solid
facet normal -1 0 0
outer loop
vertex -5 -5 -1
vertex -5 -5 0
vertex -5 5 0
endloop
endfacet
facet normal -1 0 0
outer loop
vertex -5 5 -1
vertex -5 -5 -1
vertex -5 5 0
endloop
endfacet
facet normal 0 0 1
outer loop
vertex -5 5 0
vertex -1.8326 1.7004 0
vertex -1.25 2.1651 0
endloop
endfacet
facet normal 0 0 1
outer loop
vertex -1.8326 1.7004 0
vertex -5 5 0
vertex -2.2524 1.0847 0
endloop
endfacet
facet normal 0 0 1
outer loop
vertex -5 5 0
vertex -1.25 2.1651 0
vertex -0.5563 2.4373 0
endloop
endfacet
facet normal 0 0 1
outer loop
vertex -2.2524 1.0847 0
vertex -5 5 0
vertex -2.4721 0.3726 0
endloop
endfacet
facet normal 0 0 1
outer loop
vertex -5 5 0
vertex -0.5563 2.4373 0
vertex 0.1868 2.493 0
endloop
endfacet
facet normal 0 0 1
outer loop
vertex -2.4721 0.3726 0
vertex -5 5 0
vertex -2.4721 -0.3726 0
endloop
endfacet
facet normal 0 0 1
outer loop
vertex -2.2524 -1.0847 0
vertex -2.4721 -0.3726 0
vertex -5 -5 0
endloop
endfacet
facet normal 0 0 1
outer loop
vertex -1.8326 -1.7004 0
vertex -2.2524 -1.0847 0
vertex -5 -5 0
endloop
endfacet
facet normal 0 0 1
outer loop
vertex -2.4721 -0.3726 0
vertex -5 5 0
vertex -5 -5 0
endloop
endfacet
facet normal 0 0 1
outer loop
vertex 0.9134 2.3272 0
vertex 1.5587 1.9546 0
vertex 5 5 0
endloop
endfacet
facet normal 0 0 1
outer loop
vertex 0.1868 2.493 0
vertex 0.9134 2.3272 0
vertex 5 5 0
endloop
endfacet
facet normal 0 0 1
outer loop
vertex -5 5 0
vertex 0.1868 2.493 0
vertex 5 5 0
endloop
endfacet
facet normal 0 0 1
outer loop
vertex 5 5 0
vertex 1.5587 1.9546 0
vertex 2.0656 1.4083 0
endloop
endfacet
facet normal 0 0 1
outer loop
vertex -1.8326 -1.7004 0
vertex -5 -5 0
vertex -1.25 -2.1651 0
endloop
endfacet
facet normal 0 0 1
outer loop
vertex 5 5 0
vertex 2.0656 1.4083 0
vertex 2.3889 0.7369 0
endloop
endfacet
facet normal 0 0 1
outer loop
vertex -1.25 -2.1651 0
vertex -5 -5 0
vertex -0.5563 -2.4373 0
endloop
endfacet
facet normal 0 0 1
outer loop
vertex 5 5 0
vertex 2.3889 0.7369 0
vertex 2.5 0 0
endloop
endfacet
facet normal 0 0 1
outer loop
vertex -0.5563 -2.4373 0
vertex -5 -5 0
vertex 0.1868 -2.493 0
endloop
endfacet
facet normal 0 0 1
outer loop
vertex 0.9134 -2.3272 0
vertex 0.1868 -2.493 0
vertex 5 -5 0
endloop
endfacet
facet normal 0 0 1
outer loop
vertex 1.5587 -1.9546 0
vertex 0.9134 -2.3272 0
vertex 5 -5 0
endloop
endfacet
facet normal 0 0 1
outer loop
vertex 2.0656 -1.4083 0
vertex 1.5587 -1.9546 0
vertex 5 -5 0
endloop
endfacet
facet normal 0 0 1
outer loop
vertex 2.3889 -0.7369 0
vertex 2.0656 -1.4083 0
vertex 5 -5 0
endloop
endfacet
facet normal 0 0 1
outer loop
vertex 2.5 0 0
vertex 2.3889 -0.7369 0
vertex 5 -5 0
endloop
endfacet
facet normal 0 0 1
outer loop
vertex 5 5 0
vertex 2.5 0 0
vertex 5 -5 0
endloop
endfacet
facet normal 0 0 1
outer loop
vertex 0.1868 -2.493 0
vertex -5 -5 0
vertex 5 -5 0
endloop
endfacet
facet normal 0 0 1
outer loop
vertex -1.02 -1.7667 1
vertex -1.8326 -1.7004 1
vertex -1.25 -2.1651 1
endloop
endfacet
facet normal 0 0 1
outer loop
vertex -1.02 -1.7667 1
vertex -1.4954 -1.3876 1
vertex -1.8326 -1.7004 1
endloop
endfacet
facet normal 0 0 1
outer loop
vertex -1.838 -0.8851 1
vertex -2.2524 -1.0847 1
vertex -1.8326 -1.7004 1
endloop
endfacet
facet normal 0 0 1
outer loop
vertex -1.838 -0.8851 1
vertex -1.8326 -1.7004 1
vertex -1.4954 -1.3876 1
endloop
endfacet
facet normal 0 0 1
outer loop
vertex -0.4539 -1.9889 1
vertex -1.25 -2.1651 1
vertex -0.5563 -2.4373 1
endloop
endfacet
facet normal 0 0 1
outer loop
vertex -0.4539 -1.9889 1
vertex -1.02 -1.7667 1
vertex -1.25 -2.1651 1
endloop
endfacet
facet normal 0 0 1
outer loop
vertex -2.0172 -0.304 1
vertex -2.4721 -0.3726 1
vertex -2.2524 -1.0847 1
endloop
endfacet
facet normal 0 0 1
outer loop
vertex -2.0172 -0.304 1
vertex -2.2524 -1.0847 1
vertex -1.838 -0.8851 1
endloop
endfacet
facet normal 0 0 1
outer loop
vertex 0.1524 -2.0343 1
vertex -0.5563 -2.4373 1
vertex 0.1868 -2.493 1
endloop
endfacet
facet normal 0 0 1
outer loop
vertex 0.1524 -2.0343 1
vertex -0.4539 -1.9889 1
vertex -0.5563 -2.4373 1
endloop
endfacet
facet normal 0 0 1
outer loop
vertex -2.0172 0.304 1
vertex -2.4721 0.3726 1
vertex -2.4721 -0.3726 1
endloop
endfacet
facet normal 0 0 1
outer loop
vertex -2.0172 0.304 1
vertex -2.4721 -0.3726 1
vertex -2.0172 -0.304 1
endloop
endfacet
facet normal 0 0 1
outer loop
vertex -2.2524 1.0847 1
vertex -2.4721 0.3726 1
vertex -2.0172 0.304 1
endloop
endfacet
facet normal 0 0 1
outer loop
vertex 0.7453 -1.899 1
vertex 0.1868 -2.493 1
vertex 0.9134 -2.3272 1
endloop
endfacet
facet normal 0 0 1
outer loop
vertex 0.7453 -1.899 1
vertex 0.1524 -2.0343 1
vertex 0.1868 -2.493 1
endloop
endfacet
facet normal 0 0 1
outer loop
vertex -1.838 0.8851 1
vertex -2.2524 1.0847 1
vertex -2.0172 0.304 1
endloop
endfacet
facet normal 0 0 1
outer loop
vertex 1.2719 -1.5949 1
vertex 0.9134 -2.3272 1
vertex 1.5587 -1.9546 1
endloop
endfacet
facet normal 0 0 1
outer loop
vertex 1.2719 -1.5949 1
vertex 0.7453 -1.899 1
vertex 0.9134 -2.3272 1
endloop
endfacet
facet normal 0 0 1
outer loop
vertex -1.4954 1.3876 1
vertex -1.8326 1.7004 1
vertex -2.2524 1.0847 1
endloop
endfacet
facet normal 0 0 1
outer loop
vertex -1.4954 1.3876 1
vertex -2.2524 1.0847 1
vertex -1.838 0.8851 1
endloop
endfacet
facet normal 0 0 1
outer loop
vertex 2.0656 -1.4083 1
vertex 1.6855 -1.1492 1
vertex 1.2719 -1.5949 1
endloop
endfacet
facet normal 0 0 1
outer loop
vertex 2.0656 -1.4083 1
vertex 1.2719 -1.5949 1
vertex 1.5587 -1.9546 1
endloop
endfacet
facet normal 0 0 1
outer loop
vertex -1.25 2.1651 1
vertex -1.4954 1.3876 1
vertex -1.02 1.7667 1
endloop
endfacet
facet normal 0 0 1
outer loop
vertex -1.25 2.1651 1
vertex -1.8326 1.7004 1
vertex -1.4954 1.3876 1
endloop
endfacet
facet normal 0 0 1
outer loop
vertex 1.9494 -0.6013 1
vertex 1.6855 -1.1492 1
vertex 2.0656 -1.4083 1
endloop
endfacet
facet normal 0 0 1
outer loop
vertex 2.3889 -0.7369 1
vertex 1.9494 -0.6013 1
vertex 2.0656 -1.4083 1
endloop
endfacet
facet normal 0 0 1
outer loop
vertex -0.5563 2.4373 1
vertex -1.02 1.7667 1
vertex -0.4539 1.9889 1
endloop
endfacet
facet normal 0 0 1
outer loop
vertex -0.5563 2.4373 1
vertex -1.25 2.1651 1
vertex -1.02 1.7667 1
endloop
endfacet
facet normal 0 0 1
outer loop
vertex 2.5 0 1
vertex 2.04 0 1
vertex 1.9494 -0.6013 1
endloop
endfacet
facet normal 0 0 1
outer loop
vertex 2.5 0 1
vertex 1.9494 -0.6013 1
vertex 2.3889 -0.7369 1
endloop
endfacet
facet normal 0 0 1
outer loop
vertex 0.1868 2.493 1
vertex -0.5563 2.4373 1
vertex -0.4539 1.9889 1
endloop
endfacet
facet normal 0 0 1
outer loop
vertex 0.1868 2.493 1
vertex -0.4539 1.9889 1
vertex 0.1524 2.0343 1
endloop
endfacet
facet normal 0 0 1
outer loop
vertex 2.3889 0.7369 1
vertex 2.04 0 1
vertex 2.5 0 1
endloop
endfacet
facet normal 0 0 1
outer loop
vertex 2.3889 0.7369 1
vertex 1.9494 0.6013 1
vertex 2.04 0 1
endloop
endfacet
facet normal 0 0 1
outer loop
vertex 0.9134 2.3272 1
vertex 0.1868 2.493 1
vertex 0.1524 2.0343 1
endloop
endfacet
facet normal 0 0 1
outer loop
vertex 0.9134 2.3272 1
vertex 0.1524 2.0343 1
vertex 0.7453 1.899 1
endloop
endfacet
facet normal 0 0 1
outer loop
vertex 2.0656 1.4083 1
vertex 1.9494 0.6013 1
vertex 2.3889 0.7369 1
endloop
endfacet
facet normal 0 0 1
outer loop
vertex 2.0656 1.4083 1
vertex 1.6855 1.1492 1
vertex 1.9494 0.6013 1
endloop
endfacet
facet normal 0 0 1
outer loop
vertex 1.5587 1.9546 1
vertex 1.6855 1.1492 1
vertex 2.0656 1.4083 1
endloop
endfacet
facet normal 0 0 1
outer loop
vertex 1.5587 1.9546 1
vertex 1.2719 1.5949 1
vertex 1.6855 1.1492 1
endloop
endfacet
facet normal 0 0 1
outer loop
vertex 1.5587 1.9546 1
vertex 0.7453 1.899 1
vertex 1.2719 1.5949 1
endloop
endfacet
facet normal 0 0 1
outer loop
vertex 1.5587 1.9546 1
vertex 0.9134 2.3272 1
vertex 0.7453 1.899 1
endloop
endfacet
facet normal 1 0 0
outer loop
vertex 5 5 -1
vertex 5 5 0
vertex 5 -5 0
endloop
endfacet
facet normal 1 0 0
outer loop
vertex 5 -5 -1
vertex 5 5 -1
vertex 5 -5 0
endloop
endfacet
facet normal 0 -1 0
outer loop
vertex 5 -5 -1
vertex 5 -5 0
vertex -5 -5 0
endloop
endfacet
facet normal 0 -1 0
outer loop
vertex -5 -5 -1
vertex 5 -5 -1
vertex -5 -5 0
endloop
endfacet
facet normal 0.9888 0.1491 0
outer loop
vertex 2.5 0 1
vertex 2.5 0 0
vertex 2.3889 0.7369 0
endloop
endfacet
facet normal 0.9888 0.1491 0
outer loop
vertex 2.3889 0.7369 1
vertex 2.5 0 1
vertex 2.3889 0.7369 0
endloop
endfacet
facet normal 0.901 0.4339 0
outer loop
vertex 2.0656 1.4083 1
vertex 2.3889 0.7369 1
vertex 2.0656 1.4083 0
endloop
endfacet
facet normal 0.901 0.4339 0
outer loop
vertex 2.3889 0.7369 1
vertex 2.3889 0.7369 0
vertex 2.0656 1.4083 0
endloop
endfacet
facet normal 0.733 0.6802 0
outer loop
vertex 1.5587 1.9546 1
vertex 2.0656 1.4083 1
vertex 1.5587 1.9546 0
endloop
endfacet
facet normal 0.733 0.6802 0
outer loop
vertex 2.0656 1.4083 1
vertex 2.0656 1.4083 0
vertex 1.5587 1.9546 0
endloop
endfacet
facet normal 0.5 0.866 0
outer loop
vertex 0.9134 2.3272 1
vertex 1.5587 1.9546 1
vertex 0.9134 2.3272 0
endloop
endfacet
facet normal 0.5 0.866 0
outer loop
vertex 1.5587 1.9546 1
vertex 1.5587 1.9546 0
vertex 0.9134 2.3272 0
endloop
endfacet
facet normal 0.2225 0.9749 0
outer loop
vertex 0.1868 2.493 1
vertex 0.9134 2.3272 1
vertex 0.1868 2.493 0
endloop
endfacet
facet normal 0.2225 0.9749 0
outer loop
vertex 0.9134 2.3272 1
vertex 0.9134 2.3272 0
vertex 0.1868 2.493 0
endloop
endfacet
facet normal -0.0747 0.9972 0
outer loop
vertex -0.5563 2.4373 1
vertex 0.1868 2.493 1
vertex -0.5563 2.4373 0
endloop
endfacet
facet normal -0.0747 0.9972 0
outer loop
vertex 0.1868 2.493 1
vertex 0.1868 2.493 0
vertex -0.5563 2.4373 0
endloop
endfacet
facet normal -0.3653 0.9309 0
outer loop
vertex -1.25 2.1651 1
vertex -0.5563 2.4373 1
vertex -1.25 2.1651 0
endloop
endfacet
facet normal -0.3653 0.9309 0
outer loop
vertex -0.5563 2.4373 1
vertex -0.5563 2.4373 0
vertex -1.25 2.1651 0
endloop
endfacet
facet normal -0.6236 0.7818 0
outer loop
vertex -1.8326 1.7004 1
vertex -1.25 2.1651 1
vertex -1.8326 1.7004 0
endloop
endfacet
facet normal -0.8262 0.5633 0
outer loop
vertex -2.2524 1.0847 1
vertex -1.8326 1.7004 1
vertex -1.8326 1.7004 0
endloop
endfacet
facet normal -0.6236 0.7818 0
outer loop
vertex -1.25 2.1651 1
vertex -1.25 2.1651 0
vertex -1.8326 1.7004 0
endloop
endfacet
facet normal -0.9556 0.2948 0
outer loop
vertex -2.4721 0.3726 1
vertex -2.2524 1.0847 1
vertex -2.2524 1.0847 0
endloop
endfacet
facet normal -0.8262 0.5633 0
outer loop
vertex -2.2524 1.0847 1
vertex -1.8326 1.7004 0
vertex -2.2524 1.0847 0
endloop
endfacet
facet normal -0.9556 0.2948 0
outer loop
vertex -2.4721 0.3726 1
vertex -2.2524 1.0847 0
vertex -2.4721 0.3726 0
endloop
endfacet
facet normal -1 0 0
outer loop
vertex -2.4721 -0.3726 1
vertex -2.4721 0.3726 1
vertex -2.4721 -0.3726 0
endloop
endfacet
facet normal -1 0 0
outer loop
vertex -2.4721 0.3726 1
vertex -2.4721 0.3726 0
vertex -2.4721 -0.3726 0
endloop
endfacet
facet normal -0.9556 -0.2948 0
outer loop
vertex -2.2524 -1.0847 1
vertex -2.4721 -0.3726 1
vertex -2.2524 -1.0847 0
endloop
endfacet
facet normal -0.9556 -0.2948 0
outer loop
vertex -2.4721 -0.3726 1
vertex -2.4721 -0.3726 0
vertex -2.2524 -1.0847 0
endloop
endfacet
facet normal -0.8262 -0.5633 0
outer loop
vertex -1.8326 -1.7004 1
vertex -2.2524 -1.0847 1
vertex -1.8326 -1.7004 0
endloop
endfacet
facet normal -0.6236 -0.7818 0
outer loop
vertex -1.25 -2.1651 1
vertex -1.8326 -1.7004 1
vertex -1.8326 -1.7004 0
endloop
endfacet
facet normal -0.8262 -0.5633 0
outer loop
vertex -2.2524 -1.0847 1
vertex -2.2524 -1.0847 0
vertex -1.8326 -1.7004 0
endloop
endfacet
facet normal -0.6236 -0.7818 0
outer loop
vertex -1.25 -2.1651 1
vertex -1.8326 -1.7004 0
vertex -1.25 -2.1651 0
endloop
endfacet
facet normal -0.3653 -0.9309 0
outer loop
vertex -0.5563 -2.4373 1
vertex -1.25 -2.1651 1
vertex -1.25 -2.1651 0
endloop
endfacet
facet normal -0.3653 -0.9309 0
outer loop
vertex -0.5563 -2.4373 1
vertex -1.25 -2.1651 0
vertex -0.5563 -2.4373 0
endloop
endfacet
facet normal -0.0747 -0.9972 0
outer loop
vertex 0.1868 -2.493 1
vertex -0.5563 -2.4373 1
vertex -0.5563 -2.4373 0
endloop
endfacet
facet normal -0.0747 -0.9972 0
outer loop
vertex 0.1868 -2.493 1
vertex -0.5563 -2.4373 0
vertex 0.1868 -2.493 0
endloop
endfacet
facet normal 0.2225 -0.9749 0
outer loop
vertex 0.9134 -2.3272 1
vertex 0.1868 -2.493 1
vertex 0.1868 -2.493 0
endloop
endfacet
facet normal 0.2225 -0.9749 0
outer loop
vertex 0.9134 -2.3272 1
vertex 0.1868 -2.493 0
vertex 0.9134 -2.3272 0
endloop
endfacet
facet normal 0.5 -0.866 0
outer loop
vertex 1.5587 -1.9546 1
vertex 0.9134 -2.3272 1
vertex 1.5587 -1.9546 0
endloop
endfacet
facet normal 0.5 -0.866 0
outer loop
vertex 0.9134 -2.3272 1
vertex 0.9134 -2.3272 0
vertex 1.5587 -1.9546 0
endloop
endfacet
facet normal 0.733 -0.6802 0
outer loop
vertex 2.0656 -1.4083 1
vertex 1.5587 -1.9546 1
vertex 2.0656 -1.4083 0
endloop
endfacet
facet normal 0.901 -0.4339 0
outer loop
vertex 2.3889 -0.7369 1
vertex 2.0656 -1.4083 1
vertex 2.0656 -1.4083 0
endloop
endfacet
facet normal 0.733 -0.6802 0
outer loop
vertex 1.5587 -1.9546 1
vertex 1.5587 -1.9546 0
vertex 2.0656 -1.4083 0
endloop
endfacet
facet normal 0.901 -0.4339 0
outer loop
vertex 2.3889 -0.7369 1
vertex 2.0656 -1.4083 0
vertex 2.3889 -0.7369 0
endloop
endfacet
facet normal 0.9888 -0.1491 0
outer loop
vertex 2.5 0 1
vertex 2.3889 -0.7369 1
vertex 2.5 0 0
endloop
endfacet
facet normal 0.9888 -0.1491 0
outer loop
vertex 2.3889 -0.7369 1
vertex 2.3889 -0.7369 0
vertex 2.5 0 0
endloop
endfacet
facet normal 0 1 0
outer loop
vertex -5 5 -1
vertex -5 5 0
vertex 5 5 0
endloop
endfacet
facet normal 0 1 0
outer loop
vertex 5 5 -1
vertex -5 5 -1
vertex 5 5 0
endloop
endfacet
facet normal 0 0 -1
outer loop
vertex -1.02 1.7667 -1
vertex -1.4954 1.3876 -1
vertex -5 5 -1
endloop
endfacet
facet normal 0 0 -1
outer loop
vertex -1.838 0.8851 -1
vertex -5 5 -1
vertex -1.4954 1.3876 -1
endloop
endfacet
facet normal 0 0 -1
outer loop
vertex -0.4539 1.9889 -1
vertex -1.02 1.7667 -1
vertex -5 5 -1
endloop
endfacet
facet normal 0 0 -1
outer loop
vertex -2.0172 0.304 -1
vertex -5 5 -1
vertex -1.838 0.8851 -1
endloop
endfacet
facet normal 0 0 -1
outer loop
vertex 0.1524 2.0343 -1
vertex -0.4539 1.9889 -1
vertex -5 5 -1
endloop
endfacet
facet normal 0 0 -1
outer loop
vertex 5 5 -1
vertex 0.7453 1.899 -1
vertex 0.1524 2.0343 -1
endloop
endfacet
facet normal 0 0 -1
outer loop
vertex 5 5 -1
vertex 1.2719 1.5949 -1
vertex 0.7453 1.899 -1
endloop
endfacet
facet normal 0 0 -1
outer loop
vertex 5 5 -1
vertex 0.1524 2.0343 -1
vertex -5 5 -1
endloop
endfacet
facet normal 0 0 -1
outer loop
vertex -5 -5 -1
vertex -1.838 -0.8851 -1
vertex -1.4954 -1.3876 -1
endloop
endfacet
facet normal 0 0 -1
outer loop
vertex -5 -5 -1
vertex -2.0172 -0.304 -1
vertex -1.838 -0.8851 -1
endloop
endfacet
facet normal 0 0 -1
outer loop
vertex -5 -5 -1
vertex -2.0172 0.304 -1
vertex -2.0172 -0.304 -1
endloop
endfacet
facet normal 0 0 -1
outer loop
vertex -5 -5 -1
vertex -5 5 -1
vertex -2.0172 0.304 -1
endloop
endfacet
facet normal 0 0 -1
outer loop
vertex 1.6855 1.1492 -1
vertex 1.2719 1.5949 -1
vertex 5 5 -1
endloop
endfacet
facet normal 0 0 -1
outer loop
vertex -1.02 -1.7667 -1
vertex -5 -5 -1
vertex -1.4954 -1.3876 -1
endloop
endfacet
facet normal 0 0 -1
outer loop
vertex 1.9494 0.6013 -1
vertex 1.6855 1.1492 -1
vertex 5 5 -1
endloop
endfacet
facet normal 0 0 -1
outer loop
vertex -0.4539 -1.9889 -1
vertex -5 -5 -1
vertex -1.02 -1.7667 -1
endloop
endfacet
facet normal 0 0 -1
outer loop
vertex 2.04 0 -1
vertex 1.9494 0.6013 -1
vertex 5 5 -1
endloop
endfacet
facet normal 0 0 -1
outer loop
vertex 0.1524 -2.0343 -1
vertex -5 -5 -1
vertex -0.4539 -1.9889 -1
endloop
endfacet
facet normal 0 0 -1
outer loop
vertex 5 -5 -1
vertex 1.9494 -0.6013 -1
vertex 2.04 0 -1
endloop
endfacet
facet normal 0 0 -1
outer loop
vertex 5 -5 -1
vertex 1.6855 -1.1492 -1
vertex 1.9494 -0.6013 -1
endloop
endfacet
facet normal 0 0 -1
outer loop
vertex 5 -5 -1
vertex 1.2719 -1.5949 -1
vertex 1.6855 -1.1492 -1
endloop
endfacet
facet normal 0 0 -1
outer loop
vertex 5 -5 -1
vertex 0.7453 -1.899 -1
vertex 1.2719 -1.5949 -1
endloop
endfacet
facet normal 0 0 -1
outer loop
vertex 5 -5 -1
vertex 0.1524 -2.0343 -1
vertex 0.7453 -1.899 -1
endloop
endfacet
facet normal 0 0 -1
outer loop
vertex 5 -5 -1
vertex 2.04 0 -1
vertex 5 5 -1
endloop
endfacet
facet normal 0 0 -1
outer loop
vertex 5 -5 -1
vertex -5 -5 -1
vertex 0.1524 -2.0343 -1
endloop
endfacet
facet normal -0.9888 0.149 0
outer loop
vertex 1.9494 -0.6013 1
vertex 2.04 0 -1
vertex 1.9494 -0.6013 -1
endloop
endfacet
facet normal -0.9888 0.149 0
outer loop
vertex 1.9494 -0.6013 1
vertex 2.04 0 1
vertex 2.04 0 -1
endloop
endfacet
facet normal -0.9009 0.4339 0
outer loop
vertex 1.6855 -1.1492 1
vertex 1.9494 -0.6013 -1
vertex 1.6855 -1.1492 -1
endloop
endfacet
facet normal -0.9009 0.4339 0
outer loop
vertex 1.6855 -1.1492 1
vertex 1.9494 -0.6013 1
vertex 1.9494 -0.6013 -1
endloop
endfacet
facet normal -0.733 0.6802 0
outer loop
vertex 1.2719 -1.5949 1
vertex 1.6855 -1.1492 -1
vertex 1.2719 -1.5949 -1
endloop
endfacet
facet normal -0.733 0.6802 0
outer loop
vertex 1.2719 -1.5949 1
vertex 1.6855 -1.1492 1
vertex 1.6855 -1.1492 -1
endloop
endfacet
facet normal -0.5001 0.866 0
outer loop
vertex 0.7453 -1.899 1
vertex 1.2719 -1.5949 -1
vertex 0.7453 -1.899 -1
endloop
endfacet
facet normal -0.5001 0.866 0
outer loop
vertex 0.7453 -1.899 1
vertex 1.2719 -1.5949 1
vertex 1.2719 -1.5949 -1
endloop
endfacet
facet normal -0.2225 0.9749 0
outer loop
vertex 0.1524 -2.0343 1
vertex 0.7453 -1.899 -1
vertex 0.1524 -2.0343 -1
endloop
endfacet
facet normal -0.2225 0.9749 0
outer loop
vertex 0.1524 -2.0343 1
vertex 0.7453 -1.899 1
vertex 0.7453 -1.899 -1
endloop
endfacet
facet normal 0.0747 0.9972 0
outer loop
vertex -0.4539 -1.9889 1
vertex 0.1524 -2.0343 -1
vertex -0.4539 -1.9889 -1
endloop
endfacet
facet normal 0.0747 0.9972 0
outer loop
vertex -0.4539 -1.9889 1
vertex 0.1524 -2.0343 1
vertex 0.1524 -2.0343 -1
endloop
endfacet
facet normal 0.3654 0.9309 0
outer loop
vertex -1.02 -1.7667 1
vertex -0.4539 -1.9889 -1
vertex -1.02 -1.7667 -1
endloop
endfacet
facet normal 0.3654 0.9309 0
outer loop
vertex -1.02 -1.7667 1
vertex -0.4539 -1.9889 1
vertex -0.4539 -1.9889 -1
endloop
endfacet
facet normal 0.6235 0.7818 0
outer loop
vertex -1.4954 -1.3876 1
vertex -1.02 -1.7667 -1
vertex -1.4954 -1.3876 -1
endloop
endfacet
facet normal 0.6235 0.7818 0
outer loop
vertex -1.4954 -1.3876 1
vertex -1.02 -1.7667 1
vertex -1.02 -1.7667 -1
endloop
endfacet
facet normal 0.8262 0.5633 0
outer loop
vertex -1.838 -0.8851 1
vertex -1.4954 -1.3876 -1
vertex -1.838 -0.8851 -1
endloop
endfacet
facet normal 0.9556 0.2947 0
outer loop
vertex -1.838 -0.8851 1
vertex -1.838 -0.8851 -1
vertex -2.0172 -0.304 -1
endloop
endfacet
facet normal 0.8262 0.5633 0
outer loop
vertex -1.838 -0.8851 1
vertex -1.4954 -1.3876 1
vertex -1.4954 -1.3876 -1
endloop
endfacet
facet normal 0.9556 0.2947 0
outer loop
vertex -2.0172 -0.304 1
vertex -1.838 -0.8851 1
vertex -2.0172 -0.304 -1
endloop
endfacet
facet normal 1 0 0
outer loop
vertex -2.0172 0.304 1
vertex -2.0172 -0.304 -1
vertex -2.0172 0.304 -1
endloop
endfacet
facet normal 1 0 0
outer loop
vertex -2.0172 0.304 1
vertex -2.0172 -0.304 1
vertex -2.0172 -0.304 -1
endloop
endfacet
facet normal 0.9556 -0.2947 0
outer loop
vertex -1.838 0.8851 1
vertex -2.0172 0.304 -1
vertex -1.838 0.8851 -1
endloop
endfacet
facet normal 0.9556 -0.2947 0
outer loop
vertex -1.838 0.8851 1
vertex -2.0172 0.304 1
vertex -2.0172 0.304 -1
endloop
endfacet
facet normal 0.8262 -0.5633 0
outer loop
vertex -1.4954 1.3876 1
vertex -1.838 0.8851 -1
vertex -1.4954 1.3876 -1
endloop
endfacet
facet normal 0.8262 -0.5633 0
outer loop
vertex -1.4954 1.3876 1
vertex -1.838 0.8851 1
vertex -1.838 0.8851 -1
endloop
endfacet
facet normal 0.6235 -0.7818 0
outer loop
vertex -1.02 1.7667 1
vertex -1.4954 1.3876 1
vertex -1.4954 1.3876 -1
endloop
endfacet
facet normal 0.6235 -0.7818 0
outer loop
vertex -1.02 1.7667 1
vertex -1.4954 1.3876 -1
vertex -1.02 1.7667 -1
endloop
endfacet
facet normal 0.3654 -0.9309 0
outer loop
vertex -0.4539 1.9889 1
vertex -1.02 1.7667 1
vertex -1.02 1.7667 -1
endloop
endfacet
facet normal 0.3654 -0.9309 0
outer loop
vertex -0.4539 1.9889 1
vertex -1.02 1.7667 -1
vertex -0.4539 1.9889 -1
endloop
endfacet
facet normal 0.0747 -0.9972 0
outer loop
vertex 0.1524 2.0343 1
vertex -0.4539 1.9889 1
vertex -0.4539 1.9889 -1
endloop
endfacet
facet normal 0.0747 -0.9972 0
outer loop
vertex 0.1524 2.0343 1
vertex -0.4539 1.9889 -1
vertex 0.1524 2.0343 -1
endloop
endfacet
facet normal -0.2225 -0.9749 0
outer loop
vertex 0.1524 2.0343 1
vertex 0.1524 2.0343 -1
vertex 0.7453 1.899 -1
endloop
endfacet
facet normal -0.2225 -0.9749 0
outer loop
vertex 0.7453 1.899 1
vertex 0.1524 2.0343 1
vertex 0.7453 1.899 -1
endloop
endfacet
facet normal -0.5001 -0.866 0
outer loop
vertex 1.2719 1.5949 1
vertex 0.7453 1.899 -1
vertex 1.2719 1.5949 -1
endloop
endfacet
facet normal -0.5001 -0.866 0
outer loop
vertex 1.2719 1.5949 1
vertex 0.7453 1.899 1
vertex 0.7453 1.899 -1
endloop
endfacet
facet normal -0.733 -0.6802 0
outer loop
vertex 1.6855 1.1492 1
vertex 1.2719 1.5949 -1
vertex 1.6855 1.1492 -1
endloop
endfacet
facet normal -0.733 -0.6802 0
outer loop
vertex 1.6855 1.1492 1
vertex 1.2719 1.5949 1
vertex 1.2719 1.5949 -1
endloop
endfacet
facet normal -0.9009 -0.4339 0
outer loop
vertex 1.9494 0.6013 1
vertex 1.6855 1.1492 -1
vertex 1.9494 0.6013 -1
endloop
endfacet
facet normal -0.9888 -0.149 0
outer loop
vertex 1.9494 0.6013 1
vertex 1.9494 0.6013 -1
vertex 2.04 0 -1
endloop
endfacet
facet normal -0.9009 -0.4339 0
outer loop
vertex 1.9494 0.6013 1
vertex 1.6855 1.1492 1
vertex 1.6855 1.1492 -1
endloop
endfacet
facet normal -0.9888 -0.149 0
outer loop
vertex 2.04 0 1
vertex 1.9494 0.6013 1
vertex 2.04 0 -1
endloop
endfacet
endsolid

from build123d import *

# Parameters (mm, degrees)
F0_R     = 2.5
F0_R_2   = 2.04
F1_DEPTH = 1
F2_R     = 2.5
F2_R_2   = 2.04
F3_DEPTH = 1


with BuildPart() as f1:
    # F0 (on Top) → F1 (new body)
    with BuildSketch(Plane.XY):
        Circle(F0_R)
        Circle(F0_R_2, mode=Mode.SUBTRACT)
    extrude(amount=F1_DEPTH)

    # F2 (on face) → F3 (join)
    with BuildSketch(Plane(origin=(0, 0, 0), x_dir=(1, 0, 0), z_dir=(0, 0, -1))):
        with BuildLine():
            ThreePointArc((0, -5), (3.5355339059, -3.5355339059), (5, 0))
            ThreePointArc((5, 0), (3.5355339059, 3.5355339059), (0, 5))
            ThreePointArc((0, 5), (-3.5355339059, 3.5355339059), (-5, 0))
            ThreePointArc((-5, 0), (-3.5355339059, -3.5355339059), (0, -5))
        make_face()
        Circle(F2_R, mode=Mode.SUBTRACT)
        with BuildLine():
            Line((5, -5), (5, 0))
            ThreePointArc((5, 0), (3.5355339059, -3.5355339059), (0, -5))
            Line((0, -5), (5, -5))
        make_face()
        with BuildLine():
            ThreePointArc((0, 5), (3.5355339059, 3.5355339059), (5, 0))
            Line((5, 0), (5, 5))
            Line((5, 5), (0, 5))
        make_face()
        with BuildLine():
            ThreePointArc((-5, 0), (-3.5355339059, 3.5355339059), (0, 5))
            Line((0, 5), (-5, 5))
            Line((-5, 5), (-5, 0))
        make_face()
        with BuildLine():
            Line((-5, -5), (0, -5))
            ThreePointArc((0, -5), (-3.5355339059, -3.5355339059), (-5, 0))
            Line((-5, 0), (-5, -5))
        make_face()
        Circle(F2_R)
        Circle(F2_R_2, mode=Mode.SUBTRACT)
    extrude(amount=F3_DEPTH)


solid = f1.part
